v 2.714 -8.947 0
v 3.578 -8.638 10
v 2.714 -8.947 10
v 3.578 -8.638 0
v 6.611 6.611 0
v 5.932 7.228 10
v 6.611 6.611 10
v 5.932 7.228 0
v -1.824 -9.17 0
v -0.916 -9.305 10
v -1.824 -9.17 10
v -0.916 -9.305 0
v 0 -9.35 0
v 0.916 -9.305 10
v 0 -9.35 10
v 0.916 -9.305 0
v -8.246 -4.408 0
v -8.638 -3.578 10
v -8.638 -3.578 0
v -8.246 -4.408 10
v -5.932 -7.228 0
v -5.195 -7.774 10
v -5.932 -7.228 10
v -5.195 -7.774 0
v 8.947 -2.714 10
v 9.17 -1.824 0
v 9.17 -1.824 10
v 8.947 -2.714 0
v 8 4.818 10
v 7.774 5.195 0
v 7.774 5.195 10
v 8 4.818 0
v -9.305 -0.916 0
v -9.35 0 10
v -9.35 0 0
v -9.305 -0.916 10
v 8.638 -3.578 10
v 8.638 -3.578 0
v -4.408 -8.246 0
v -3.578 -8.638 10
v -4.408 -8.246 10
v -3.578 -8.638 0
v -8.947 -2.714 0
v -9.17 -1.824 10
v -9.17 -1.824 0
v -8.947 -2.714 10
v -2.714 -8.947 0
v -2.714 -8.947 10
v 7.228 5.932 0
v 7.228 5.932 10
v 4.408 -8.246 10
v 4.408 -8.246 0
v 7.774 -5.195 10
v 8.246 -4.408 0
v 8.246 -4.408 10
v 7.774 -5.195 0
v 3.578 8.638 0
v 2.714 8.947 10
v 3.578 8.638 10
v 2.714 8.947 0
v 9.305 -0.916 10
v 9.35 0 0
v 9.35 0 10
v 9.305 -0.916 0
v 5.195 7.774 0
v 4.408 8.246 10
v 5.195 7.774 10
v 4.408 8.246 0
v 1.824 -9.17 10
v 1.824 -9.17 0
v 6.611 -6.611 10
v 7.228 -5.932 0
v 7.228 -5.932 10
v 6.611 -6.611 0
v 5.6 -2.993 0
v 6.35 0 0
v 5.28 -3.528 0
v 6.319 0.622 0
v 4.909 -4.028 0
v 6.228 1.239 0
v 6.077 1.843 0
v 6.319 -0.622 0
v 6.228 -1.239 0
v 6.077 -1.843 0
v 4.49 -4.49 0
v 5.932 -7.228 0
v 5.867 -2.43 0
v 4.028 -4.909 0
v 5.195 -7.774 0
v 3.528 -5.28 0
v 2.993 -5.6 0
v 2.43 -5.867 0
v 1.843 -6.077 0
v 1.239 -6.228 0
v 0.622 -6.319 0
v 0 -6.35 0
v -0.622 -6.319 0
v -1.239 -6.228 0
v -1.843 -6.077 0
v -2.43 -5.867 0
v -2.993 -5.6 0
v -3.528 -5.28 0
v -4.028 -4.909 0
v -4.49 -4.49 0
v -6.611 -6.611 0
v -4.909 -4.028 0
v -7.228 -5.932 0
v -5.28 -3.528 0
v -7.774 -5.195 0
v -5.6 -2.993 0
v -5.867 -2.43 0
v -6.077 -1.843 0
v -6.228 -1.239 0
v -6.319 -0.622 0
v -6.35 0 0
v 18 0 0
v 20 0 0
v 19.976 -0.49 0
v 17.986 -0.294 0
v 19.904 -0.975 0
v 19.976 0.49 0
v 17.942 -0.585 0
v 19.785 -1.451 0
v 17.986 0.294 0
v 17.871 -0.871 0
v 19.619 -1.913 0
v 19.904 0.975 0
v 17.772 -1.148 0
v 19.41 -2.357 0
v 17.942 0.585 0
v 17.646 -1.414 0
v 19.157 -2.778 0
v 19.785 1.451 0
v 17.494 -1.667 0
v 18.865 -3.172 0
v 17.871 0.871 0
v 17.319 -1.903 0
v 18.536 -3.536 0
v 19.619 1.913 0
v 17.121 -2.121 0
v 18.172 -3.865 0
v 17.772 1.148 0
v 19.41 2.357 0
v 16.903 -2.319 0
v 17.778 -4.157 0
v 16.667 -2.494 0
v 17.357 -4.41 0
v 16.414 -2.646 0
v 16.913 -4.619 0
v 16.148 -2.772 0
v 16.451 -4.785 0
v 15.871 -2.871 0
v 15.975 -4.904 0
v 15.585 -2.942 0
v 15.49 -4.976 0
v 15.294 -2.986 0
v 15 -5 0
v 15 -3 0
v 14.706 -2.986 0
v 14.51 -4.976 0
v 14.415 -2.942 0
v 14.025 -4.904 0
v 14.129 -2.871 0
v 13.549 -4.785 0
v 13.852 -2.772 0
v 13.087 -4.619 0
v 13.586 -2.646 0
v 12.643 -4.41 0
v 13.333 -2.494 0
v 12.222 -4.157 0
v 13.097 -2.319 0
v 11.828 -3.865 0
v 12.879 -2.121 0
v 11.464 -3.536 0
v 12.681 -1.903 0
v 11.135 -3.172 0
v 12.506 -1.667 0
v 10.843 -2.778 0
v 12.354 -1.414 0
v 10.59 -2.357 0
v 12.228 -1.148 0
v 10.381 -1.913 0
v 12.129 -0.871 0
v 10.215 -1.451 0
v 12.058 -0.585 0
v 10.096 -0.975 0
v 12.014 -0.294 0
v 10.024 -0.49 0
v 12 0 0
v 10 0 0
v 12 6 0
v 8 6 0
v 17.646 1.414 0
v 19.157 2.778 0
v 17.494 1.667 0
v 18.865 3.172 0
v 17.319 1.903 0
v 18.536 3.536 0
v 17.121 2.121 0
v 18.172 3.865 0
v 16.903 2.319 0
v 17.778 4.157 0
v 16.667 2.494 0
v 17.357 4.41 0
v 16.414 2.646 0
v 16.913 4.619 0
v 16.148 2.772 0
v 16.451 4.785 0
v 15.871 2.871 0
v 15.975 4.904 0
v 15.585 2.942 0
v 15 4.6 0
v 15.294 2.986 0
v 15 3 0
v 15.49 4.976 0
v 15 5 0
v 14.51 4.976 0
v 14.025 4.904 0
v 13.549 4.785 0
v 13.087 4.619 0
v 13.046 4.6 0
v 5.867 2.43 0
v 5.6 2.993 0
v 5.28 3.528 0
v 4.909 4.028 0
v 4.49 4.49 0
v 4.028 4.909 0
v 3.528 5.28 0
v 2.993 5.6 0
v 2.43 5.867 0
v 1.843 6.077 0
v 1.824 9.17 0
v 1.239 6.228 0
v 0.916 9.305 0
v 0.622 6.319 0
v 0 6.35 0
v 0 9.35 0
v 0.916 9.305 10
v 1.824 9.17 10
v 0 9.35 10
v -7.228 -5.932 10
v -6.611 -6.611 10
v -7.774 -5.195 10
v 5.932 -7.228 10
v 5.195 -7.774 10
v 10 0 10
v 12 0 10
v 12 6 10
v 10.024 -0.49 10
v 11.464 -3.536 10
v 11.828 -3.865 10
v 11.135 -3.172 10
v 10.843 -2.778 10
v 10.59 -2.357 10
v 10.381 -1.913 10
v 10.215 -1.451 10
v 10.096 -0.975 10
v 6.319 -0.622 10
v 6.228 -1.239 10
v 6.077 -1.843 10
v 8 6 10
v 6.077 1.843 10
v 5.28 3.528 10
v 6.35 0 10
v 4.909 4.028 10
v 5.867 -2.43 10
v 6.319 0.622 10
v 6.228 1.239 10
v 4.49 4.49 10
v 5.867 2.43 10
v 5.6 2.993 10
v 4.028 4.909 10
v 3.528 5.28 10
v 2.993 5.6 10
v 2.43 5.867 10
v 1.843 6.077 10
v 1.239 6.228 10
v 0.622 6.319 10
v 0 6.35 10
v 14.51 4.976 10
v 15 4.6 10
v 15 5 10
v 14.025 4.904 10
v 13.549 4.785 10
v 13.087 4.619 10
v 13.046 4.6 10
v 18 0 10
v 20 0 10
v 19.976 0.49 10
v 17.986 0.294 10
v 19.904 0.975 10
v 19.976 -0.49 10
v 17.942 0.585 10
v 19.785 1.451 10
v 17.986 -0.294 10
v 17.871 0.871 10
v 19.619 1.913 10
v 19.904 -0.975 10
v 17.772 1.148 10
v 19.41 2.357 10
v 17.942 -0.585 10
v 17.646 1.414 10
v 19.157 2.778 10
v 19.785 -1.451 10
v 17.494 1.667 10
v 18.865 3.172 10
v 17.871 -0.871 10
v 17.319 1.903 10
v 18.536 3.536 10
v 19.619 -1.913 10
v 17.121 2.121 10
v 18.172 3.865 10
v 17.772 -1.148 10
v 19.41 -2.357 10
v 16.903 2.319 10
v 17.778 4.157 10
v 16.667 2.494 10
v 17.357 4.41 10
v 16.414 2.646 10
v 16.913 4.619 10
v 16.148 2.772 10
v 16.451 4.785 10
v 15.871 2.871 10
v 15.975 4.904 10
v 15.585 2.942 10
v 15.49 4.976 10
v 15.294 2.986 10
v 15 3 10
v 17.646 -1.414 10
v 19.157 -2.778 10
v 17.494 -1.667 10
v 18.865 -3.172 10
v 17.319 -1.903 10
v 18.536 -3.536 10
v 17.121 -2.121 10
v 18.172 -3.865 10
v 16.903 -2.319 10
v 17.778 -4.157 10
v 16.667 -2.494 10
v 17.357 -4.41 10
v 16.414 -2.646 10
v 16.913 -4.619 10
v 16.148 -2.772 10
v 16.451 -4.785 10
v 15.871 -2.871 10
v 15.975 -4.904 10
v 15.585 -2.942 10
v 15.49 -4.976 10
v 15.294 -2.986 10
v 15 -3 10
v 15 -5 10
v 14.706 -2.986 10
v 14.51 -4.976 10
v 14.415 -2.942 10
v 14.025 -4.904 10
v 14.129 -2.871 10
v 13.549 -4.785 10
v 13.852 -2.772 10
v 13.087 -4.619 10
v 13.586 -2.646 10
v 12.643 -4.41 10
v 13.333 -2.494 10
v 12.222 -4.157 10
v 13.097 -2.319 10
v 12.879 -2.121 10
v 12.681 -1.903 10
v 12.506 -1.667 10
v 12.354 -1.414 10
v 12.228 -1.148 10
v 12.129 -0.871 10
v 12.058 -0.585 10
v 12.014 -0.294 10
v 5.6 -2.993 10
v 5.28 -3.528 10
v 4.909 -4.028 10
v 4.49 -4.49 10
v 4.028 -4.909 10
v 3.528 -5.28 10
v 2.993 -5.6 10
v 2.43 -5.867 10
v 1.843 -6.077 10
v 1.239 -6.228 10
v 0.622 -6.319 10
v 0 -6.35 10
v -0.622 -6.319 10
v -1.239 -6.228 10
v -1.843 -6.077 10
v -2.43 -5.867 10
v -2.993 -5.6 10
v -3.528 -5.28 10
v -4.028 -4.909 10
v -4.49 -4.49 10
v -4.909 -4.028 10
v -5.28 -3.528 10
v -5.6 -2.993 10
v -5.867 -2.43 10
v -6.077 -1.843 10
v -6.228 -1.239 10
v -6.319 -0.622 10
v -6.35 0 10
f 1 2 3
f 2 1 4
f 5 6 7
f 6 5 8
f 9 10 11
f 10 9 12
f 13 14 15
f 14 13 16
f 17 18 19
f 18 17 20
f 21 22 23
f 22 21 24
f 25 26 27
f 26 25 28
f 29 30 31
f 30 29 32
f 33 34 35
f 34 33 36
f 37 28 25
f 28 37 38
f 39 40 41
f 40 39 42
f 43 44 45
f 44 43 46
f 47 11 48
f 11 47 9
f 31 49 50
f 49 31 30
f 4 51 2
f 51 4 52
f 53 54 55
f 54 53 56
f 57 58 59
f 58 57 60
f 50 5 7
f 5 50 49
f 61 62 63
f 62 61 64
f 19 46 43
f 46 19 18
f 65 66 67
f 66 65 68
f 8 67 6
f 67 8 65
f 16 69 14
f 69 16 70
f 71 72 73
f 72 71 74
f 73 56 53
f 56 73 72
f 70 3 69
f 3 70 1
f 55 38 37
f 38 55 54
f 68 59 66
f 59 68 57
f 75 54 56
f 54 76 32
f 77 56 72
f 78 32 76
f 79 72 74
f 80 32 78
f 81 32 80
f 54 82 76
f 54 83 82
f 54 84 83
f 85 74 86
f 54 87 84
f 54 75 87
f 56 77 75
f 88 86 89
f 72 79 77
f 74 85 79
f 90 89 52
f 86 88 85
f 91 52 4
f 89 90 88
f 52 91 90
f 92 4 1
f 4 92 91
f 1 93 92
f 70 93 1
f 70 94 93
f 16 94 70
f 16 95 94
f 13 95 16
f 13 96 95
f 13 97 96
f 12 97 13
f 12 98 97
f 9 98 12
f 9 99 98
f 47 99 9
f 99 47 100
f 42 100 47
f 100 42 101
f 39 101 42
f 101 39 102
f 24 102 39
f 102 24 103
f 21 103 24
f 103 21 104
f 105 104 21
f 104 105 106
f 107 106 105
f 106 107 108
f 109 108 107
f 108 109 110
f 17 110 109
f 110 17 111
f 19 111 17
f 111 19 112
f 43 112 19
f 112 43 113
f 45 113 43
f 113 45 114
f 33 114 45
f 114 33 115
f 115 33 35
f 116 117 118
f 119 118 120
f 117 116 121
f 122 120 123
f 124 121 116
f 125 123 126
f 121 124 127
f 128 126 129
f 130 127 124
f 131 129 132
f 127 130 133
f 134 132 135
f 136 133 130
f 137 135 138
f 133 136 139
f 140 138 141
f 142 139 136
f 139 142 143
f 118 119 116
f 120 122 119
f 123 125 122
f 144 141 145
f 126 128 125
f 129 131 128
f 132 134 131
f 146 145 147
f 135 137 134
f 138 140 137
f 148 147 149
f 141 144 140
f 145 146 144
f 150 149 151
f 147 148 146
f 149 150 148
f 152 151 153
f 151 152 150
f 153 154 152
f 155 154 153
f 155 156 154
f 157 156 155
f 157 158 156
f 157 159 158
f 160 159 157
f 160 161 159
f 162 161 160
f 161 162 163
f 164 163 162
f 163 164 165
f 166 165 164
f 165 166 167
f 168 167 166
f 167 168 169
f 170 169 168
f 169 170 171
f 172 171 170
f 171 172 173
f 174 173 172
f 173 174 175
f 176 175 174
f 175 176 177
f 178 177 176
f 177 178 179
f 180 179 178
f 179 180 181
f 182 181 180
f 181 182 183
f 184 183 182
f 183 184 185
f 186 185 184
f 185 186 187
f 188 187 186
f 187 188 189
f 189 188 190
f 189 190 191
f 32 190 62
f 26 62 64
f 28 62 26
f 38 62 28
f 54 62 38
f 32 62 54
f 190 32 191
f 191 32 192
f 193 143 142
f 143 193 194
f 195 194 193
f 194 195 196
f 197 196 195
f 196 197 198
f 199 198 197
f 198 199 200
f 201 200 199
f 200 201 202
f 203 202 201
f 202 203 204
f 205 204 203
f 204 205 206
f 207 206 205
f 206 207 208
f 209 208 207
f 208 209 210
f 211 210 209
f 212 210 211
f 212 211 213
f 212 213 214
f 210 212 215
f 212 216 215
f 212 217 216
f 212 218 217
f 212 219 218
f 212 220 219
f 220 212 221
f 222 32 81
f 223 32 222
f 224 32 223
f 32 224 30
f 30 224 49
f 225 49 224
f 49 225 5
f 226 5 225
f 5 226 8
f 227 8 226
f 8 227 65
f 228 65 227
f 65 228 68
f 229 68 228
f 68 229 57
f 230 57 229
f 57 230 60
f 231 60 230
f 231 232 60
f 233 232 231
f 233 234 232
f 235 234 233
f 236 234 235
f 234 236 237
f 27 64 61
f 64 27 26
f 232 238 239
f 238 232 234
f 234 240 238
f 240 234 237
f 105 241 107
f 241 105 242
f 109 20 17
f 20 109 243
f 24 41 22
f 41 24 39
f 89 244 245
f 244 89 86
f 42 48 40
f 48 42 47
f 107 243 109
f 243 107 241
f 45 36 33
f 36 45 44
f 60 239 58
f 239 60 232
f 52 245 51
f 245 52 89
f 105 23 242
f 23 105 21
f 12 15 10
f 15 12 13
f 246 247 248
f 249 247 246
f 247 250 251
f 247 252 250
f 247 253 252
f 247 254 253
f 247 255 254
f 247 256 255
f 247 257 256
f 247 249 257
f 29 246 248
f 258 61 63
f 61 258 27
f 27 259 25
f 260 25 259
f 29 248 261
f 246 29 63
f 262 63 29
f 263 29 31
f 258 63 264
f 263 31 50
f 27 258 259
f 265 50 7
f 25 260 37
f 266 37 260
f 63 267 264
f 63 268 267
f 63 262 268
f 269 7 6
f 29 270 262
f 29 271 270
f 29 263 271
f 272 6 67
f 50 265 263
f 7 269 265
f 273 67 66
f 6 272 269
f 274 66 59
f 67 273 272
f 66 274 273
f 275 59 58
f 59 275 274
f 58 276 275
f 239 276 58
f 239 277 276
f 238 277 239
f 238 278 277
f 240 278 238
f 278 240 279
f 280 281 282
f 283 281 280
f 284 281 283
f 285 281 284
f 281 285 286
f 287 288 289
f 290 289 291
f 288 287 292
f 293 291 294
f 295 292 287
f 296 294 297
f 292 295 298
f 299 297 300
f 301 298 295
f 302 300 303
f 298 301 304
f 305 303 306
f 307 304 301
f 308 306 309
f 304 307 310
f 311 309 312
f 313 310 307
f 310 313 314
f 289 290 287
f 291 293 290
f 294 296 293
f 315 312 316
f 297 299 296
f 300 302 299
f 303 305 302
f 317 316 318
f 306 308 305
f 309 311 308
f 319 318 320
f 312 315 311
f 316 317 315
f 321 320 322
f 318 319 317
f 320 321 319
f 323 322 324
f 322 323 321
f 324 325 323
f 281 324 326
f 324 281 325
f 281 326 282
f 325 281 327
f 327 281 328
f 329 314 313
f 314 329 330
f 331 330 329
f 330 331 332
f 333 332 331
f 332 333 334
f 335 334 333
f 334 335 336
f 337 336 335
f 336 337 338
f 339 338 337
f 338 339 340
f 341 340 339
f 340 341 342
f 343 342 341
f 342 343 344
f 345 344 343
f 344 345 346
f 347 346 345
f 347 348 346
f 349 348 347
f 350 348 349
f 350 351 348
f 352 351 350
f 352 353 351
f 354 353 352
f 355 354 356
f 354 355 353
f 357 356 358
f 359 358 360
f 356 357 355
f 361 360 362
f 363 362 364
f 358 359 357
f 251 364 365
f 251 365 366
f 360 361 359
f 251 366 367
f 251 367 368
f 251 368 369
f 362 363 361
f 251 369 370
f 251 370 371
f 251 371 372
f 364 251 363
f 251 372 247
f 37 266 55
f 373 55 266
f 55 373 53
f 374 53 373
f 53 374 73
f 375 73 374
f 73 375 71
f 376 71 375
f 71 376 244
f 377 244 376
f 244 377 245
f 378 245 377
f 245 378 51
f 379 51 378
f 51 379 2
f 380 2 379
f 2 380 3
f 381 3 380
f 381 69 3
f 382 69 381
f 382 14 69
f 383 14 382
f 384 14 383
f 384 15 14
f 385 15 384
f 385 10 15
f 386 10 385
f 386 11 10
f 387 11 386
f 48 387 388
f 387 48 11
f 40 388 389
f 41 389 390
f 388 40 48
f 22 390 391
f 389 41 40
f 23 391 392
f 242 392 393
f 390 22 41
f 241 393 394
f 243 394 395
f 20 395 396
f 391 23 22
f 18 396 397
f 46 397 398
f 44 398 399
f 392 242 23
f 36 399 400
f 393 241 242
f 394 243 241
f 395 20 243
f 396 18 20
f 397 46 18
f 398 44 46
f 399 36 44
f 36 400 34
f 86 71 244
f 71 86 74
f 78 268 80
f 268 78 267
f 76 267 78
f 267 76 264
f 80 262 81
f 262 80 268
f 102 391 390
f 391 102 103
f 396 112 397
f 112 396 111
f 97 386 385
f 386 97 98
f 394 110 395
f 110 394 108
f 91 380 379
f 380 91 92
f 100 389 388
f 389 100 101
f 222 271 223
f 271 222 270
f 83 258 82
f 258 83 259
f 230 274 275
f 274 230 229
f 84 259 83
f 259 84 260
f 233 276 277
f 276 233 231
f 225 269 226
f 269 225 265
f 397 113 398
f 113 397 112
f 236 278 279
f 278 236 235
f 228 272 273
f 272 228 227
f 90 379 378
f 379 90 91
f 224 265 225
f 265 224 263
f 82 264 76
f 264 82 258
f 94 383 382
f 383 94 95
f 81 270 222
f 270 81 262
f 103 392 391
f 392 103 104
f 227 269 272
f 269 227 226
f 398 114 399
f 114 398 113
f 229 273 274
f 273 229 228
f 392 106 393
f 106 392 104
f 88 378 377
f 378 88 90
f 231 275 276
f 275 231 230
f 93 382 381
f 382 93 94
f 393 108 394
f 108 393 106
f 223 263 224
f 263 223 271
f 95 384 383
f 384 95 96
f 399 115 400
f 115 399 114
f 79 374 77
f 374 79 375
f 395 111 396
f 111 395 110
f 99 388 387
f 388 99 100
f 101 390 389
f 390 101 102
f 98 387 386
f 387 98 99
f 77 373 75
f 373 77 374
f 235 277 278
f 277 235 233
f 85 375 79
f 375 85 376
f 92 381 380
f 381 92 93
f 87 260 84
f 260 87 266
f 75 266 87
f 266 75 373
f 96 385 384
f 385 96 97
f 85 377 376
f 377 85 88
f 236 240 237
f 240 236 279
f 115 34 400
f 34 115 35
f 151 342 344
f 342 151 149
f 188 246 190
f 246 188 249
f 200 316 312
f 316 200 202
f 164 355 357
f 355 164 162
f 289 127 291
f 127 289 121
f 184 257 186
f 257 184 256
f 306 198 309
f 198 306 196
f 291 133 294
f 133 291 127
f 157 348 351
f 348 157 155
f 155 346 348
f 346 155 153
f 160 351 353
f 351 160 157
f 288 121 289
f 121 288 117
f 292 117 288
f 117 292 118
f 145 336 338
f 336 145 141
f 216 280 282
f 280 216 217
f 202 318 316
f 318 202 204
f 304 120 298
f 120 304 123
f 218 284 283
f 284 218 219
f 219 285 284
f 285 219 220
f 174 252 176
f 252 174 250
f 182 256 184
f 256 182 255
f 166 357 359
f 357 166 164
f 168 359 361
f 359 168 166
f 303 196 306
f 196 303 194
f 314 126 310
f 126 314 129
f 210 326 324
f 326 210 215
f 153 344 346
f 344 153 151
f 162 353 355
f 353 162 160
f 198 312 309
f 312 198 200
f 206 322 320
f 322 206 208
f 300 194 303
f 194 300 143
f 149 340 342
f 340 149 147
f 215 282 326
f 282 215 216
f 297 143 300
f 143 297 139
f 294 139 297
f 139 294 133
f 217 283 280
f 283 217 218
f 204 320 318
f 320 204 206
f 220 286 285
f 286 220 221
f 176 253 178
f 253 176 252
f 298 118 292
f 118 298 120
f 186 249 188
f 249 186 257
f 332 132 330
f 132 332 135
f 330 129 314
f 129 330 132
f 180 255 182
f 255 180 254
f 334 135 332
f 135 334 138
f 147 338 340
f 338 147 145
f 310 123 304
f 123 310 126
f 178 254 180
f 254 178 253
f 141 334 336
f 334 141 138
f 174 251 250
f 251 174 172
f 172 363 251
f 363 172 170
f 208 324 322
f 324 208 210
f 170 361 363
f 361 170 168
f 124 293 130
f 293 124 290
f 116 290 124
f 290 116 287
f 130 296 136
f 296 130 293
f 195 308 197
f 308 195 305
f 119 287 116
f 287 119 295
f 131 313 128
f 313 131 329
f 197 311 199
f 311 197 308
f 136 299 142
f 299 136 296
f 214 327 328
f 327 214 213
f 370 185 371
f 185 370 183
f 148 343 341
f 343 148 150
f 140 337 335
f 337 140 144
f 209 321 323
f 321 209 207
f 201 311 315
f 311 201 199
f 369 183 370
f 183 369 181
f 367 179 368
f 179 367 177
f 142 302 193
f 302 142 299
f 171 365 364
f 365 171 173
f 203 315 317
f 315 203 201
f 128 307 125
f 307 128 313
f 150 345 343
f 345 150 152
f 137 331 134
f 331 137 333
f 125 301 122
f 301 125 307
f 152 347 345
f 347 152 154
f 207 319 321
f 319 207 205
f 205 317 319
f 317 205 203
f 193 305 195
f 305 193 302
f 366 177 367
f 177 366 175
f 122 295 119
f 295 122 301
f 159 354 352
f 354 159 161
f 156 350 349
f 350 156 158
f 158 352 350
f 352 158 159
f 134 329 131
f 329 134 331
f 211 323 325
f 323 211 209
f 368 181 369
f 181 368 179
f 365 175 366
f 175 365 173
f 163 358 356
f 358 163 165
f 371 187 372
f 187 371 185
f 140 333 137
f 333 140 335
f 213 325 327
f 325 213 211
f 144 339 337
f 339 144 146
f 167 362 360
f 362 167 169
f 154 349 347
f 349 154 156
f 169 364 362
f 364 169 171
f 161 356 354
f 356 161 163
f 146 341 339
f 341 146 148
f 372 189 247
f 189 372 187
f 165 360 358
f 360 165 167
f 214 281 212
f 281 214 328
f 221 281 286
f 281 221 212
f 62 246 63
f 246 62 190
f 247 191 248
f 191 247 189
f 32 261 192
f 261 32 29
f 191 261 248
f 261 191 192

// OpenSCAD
// --- Dimensions ---
// Rod ring inner diameter
rod_id = 12.7;
// Rod ring wall thickness
rod_wall = 3;
// Rod ring outer diameter
rod_od = rod_id + 2 * rod_wall; // 18.7

// Rod ring opening width (Y direction)
rod_opening_y = 10;
// Rod ring opening extent in X (from -X side)
rod_opening_x = 5; // Remove everything with x < 0 and -5 < y < 5

// Tubing ring inner diameter
tube_id = 6;
// Tubing ring wall thickness
tube_wall = 2;
// Tubing ring outer diameter
tube_od = tube_id + 2 * tube_wall; // 10

// Tubing ring center position
tube_cx = 15;
tube_cy = 0;

// Tubing ring opening width (Y direction)
tube_opening_y = 4.5;
// Tubing ring opening extent in X (from +X side)
tube_opening_x = 2.25; // Remove everything with x > 15 and -2.25 < y < 2.25

// Bridge width (Y direction)
bridge_y = 6;
// Bridge X extent
bridge_x_start = 8;
bridge_x_end = 12;

// Extrusion height (Z)
height = 10;

// --- Model ---
$fn = 64;

module rod_ring() {
    difference() {
        // Outer cylinder
        cylinder(h = height, d = rod_od, center = false);
        // Inner cylinder (hole)
        cylinder(h = height + 0.1, d = rod_id, center = false);
        // Opening cutout: remove x < 0, -5 < y < 5
        translate([-rod_od/2 - 0.1, 0, 0])
            cube([rod_od/2 + 0.1, rod_opening_y + 0.1, height + 0.1], center = false);
    }
}

module tubing_ring() {
    difference() {
        // Outer cylinder
        translate([tube_cx, tube_cy, 0])
            cylinder(h = height, d = tube_od, center = false);
        // Inner cylinder (hole)
        translate([tube_cx, tube_cy, 0])
            cylinder(h = height + 0.1, d = tube_id, center = false);
        // Opening cutout: remove x > 15, -2.25 < y < 2.25
        translate([tube_cx - tube_od/2 - 0.1, 0, 0])
            cube([tube_od/2 + 0.1, tube_opening_y + 0.1, height + 0.1], center = false);
    }
}

module bridge() {
    translate([bridge_x_start, 0, 0])
        cube([bridge_x_end - bridge_x_start, bridge_y, height], center = false);
}

// Combine all parts
union() {
    rod_ring();
    tubing_ring();
    bridge();
}
